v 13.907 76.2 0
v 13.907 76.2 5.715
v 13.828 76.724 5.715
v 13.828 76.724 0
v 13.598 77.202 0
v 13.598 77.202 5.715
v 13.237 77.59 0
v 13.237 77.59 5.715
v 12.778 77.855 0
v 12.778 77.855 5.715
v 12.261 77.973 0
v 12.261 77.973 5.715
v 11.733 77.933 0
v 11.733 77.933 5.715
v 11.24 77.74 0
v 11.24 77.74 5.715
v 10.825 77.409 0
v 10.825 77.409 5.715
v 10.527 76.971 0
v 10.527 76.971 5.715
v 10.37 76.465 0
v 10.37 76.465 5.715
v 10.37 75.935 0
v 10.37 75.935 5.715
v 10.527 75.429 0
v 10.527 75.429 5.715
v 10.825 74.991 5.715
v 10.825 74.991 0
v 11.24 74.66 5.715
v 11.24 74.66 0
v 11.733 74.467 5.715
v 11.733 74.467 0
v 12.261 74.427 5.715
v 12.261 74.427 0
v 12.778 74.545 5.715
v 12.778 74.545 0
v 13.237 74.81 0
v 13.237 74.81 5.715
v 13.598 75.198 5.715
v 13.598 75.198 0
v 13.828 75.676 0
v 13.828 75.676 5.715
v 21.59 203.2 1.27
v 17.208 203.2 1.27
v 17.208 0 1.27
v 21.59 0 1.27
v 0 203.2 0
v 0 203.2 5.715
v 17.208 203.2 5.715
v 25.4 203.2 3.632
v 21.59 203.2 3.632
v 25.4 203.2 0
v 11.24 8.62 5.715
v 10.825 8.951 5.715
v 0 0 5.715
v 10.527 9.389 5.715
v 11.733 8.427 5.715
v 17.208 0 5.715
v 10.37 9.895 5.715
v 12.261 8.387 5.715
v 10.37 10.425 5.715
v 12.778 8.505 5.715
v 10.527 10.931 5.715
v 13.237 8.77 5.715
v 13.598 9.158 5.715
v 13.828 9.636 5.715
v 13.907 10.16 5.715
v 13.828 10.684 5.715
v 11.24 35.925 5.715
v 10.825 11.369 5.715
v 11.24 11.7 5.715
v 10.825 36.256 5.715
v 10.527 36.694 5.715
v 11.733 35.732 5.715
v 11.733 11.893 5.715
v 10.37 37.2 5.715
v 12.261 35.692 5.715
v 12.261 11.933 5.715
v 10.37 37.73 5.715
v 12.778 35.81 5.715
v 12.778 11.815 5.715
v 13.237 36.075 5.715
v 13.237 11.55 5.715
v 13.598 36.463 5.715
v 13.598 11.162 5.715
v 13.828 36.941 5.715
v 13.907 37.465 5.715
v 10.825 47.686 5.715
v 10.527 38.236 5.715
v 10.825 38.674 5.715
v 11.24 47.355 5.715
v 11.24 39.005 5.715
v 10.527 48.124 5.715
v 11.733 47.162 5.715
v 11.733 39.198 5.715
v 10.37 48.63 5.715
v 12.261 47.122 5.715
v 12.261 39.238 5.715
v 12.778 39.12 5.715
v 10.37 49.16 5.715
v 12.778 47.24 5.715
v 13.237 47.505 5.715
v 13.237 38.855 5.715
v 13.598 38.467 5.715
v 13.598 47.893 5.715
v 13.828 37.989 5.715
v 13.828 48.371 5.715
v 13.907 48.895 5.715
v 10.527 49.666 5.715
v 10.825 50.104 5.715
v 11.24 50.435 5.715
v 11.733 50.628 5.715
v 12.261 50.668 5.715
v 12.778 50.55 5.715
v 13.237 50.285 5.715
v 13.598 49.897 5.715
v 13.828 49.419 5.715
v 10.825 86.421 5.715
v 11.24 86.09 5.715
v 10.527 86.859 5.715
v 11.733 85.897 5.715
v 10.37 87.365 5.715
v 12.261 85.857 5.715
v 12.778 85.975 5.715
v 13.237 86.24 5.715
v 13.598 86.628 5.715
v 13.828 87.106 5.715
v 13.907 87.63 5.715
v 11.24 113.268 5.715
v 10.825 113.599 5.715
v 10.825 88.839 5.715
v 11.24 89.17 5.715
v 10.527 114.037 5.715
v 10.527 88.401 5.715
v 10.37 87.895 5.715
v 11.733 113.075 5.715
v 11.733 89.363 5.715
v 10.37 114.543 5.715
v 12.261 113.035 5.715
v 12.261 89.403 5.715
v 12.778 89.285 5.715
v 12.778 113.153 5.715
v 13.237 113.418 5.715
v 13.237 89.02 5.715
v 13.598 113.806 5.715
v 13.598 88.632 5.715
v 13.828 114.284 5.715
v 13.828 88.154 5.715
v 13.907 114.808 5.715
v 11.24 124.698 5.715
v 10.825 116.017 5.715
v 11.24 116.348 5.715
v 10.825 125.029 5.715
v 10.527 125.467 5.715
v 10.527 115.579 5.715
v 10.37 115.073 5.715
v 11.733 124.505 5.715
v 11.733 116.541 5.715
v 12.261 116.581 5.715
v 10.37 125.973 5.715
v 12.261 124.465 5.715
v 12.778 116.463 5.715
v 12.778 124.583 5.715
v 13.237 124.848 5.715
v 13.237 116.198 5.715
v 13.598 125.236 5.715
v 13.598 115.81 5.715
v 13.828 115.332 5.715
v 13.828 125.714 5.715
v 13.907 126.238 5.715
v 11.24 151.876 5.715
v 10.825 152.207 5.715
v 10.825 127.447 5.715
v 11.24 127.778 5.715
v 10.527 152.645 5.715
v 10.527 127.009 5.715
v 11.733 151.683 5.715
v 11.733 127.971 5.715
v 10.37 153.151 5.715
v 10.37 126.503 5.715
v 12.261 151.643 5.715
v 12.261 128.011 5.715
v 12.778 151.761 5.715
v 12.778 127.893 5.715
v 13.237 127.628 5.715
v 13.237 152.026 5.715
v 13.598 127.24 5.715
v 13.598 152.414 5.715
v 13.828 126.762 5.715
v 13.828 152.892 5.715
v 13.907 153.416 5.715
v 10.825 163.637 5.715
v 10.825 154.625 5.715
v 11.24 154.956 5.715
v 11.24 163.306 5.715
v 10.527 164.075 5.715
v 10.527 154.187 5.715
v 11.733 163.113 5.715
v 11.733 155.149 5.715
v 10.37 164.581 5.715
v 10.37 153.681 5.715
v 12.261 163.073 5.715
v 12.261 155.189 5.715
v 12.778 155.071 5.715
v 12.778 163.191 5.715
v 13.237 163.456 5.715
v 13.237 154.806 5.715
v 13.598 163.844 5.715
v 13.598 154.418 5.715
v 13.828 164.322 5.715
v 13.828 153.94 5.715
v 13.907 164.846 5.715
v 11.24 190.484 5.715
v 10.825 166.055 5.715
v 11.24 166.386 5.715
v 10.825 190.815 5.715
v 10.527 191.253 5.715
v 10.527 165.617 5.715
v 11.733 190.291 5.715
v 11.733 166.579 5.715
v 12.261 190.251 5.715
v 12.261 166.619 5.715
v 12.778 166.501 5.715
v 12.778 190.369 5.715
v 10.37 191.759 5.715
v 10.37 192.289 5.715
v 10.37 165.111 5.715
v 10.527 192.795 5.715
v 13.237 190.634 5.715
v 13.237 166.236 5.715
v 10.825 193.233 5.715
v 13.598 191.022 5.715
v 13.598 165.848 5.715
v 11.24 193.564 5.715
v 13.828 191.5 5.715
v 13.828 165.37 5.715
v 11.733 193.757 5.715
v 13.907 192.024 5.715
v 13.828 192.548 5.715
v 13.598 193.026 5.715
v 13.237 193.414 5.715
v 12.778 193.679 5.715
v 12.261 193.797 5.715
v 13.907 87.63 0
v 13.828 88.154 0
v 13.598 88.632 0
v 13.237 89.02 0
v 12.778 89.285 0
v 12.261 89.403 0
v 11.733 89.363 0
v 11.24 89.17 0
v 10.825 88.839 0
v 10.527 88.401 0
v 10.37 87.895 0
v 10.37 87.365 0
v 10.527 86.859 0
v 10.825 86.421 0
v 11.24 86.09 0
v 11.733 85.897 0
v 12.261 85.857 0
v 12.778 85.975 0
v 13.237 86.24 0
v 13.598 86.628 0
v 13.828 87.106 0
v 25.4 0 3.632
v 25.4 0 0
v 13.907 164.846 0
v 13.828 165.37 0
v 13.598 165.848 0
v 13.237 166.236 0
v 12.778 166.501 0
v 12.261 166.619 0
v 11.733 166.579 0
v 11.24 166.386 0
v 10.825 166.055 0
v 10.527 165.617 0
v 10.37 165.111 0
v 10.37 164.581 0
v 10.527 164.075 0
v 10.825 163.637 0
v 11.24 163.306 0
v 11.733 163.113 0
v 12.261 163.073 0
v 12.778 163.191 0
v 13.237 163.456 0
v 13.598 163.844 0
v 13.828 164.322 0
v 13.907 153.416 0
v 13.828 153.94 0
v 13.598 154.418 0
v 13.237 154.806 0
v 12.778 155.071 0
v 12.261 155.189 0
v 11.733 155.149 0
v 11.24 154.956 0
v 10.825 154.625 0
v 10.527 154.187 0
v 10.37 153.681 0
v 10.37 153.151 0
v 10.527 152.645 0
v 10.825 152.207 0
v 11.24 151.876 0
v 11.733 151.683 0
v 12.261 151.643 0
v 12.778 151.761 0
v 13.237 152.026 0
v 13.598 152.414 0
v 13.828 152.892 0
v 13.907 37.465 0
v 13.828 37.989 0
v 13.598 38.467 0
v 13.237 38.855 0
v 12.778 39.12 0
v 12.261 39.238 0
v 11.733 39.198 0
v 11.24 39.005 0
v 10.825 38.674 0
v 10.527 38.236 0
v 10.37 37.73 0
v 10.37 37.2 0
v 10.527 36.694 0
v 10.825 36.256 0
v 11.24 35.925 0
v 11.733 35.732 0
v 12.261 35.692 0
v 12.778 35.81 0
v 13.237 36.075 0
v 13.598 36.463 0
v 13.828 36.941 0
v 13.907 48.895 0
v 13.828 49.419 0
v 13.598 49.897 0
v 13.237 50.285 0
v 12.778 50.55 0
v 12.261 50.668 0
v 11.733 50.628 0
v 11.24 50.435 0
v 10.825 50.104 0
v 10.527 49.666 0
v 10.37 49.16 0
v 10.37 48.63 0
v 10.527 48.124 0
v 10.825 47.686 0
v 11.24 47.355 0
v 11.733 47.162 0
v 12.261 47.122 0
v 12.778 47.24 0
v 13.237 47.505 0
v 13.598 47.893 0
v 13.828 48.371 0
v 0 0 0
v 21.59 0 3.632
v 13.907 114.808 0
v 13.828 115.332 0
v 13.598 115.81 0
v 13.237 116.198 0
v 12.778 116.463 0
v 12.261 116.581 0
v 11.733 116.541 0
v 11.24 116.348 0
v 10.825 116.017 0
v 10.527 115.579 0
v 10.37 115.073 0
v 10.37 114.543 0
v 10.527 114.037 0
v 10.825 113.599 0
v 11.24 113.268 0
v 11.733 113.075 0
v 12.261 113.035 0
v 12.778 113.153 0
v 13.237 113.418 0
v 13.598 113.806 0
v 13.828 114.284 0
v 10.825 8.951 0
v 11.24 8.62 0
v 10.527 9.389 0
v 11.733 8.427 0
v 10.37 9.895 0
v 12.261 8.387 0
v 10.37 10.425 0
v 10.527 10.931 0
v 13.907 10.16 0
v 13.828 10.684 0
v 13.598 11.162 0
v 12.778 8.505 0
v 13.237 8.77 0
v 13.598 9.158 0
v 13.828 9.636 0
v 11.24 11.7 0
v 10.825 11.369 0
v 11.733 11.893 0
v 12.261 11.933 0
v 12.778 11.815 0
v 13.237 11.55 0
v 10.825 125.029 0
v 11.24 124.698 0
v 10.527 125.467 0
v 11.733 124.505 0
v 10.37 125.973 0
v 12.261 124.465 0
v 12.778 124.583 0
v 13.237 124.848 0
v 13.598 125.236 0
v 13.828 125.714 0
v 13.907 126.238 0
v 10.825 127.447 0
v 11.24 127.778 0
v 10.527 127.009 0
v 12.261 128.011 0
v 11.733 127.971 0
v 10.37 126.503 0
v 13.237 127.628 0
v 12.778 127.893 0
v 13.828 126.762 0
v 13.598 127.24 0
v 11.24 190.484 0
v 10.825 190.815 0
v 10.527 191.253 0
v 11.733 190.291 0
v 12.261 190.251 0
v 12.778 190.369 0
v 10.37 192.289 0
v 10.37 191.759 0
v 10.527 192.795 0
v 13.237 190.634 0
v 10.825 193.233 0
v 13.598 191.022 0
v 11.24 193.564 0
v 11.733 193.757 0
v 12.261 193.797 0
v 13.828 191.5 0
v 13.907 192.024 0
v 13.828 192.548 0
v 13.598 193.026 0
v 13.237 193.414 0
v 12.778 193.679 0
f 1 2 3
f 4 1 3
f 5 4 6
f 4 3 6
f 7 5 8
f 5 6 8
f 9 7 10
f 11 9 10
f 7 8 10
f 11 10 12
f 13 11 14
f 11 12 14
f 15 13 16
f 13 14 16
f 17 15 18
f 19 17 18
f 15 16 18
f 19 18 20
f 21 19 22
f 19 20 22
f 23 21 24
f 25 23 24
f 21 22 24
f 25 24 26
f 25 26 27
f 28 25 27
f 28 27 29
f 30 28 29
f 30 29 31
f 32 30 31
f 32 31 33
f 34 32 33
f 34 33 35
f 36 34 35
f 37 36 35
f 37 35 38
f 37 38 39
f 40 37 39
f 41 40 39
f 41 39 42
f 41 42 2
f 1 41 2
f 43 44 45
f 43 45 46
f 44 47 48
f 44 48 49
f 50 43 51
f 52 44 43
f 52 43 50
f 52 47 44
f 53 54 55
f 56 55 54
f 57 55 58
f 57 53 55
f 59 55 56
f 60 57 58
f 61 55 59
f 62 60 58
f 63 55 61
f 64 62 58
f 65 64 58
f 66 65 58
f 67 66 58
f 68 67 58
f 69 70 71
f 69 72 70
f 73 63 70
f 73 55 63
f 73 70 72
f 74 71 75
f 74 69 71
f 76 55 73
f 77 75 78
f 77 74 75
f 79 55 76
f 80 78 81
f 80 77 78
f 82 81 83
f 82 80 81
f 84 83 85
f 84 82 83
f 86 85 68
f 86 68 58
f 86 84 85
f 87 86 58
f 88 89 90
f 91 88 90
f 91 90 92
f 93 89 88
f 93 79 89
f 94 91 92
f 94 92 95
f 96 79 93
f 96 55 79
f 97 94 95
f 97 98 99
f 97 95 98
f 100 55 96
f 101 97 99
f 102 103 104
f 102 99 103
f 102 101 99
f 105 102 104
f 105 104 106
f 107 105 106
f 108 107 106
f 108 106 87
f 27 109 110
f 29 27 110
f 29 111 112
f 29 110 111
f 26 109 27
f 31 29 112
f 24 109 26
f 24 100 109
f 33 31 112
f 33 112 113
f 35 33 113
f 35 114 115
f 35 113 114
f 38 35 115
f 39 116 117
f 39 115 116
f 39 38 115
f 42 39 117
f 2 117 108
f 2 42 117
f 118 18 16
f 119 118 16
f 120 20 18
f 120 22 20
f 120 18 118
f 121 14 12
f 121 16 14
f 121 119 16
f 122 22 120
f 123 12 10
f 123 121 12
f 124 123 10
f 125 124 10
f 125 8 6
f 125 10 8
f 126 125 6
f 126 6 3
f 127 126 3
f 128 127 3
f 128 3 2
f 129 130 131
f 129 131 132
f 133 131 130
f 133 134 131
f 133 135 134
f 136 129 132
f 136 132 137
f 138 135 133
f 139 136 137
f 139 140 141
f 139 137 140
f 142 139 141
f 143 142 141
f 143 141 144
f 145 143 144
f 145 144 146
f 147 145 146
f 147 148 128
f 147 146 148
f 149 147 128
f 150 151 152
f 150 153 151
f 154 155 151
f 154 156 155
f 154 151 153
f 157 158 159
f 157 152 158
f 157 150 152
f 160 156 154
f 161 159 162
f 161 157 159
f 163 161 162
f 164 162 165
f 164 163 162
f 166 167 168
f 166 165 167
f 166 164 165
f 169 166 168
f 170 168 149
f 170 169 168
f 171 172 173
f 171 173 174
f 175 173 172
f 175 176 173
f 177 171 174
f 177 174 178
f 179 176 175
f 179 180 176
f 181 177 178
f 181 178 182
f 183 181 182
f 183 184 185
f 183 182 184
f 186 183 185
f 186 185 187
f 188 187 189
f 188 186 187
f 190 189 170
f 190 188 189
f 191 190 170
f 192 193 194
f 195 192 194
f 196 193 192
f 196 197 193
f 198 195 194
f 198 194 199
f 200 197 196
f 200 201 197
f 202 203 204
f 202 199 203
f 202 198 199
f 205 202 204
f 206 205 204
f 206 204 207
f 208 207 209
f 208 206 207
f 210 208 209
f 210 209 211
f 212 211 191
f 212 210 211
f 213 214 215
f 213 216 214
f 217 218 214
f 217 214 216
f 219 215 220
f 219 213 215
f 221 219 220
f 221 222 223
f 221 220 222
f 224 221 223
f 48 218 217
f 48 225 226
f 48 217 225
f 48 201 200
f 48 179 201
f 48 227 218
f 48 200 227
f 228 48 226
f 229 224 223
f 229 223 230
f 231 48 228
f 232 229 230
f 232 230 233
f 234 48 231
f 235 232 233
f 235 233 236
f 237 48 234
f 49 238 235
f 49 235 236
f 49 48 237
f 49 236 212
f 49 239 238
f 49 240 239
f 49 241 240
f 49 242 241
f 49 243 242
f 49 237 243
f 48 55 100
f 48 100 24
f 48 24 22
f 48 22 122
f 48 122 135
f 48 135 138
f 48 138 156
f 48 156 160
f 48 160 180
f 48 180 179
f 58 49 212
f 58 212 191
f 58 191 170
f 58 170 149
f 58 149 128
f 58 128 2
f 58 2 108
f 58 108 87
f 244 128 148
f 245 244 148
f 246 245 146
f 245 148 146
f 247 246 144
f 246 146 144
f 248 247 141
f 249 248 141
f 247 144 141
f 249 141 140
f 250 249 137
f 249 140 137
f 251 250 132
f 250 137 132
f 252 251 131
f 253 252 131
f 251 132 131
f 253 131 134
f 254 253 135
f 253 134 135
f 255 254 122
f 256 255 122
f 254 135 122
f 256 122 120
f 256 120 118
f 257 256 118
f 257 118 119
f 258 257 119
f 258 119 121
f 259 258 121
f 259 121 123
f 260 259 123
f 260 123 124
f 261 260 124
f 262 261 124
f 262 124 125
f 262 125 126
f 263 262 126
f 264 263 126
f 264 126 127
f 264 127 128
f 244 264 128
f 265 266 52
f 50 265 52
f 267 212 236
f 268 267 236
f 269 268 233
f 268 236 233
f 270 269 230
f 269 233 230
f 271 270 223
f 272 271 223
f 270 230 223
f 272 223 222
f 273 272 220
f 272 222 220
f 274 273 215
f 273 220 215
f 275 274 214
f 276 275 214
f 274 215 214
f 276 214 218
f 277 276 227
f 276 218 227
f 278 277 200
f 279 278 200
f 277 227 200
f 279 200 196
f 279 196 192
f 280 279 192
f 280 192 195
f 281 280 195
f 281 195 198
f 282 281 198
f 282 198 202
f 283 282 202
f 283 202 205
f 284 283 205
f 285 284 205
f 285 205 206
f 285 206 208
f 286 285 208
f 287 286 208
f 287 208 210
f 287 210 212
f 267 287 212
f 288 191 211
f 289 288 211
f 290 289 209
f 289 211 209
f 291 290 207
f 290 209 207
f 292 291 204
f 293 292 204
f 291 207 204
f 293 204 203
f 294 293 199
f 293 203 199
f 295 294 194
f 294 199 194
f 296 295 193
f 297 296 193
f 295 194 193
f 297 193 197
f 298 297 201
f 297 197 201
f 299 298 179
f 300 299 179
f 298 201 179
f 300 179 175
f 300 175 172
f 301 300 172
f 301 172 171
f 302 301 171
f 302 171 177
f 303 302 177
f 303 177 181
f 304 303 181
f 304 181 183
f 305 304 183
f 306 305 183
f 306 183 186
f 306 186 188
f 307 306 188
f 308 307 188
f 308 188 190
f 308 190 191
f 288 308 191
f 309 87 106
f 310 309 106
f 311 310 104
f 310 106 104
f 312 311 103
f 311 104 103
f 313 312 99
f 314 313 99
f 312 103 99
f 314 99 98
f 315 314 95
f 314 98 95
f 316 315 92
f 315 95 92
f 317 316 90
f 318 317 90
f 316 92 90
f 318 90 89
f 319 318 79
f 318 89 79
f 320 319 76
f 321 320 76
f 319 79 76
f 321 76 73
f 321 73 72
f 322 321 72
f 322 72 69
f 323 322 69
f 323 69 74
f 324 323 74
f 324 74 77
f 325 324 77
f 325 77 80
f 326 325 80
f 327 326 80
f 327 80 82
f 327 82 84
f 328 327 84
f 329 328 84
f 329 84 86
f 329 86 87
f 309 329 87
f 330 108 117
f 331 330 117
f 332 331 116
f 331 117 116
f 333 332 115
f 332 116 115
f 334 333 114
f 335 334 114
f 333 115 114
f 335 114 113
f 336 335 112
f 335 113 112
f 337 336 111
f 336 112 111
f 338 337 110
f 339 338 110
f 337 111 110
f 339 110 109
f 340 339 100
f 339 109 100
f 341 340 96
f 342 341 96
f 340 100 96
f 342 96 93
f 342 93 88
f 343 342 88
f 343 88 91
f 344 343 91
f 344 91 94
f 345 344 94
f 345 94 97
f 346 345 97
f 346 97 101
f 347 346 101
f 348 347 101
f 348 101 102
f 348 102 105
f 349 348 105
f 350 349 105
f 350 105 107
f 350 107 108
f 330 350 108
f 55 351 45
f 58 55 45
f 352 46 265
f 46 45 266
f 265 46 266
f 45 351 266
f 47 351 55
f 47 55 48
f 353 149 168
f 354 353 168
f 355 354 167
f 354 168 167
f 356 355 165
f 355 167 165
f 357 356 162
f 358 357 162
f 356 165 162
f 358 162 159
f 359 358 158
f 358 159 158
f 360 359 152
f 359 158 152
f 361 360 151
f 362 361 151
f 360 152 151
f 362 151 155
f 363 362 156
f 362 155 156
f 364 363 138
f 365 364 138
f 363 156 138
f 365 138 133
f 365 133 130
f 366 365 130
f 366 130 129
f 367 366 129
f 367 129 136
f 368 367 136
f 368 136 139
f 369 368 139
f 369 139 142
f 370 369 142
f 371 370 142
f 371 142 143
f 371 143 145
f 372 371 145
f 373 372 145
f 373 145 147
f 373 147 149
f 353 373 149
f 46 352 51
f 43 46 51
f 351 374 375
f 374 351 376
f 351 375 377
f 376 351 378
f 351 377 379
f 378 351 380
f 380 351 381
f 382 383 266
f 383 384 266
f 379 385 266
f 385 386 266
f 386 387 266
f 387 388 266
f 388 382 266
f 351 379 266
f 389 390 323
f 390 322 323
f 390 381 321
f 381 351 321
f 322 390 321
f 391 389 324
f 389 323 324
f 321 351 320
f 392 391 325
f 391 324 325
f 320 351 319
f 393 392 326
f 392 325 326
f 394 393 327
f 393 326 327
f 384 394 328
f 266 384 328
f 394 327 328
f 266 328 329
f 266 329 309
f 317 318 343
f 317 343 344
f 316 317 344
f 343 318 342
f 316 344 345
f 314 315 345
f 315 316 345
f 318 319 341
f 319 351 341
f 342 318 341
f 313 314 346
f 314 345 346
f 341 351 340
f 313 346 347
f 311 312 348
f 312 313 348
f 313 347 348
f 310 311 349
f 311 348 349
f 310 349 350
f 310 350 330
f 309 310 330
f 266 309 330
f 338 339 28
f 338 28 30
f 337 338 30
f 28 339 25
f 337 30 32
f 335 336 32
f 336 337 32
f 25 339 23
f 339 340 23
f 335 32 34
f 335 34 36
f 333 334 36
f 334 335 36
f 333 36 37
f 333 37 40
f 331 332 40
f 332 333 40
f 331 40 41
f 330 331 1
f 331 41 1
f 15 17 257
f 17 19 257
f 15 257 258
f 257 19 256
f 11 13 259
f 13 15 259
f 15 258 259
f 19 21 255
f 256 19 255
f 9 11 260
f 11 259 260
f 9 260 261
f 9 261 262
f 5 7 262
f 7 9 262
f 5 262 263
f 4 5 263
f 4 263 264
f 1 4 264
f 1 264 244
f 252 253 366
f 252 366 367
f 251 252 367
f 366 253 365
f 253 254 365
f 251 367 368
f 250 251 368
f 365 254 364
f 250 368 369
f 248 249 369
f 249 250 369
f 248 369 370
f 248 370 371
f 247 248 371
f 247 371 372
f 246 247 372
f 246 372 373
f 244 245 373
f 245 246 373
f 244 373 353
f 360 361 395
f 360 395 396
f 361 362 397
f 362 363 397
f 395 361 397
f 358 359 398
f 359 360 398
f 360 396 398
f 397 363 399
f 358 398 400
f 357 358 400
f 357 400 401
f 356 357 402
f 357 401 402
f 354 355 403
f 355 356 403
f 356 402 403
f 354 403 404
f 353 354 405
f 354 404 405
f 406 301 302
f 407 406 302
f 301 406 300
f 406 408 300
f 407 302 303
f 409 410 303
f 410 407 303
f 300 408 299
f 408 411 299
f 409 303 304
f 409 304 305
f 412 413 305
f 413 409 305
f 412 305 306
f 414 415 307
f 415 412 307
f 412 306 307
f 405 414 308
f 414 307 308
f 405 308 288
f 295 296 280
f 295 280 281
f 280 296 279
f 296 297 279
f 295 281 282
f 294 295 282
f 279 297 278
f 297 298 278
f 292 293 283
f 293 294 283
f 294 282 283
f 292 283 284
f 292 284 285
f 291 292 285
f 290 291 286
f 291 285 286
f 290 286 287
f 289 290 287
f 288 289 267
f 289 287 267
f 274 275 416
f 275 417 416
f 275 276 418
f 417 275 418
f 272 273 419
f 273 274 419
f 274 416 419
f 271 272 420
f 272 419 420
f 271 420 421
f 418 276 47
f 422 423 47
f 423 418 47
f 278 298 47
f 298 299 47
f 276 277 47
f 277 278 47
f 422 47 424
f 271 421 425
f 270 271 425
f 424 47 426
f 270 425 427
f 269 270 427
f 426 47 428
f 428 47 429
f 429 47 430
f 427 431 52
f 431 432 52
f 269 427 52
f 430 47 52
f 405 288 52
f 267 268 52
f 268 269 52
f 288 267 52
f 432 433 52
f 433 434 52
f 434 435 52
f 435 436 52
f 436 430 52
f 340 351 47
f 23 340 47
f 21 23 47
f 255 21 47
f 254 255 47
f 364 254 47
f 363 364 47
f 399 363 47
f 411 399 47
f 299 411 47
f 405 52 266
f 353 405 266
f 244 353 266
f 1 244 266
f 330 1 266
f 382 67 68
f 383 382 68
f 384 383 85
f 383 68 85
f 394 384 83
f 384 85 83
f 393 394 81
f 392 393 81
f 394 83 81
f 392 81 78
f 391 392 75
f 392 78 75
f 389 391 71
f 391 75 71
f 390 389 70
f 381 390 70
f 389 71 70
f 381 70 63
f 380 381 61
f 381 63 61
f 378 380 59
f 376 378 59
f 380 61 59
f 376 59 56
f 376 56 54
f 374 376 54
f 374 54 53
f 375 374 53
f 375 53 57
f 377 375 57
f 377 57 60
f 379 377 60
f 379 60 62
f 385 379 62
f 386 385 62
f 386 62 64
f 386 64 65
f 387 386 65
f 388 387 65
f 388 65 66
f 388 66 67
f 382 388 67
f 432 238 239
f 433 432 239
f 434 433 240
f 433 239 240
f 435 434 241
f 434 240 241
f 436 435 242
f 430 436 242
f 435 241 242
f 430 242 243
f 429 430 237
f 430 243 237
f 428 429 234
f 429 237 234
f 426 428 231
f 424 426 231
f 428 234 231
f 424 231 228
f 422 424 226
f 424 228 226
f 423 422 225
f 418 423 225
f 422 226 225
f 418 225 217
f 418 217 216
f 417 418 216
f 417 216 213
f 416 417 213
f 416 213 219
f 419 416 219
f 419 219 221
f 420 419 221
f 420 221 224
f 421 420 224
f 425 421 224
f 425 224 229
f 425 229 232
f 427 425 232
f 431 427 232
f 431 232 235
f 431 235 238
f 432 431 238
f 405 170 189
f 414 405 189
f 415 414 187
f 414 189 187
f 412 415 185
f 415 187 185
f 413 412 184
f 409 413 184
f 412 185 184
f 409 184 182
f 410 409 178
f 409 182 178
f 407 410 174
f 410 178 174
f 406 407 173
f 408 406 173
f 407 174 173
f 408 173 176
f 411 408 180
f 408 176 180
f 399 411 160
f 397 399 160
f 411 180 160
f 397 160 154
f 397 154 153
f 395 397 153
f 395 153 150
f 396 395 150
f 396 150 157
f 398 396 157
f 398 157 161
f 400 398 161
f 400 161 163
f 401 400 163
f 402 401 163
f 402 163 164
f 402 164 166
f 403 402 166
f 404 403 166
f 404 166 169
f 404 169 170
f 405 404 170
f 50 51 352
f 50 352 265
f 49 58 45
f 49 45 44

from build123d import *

# Parameters (mm, degrees)
F0_W     = 25.4
F0_H     = 203.2
F1_DEPTH = 5.715
F2_W     = 4.3815
F2_H     = 203.2
F3_DEPTH = 4.445
F4_W     = 22.456064
F4_H     = 239.023939
F5_DEPTH = 2.0828
F6_R     = 1.778
F7_DEPTH = 25.4


with BuildPart() as f1:
    # F0 (on Top) → F1 (new body)
    with BuildSketch(Plane.XY):
        with Locations((12.7, 101.6)):
            Rectangle(F0_W, F0_H)
    extrude(amount=F1_DEPTH)

    # F2 (on face) → F3 (cut)
    with BuildSketch(Plane.XY.offset(5.715)):
        with Locations((19.39925, 101.6)):
            Rectangle(F2_W, F2_H)
    extrude(amount=-F3_DEPTH, mode=Mode.SUBTRACT)

    # F4 (on face) → F5 (cut)
    with BuildSketch(Plane.XY.offset(5.715)):
        with Locations((30.91247, 90.933911)):
            Rectangle(F4_W, F4_H)
    extrude(amount=-F5_DEPTH, mode=Mode.SUBTRACT)

    # F6 (on face) → F7 (cut)
    with BuildSketch(Plane.XY.offset(5.715)):
        with Locations((12.1285, 37.465)):
            Circle(F6_R)
        with Locations((12.1285, 10.16)):
            Circle(F6_R)
        with Locations((12.1285, 48.895)):
            Circle(F6_R)
        with Locations((12.1285, 87.63)):
            Circle(F6_R)
        with Locations((12.1285, 76.2)):
            Circle(F6_R)
        with Locations((12.1285, 114.808)):
            Circle(F6_R)
        with Locations((12.1285, 126.238)):
            Circle(F6_R)
        with Locations((12.1285, 153.416)):
            Circle(F6_R)
        with Locations((12.1285, 164.846)):
            Circle(F6_R)
        with Locations((12.1285, 192.024)):
            Circle(F6_R)
    extrude(amount=-F7_DEPTH, mode=Mode.SUBTRACT)


solid = f1.part
